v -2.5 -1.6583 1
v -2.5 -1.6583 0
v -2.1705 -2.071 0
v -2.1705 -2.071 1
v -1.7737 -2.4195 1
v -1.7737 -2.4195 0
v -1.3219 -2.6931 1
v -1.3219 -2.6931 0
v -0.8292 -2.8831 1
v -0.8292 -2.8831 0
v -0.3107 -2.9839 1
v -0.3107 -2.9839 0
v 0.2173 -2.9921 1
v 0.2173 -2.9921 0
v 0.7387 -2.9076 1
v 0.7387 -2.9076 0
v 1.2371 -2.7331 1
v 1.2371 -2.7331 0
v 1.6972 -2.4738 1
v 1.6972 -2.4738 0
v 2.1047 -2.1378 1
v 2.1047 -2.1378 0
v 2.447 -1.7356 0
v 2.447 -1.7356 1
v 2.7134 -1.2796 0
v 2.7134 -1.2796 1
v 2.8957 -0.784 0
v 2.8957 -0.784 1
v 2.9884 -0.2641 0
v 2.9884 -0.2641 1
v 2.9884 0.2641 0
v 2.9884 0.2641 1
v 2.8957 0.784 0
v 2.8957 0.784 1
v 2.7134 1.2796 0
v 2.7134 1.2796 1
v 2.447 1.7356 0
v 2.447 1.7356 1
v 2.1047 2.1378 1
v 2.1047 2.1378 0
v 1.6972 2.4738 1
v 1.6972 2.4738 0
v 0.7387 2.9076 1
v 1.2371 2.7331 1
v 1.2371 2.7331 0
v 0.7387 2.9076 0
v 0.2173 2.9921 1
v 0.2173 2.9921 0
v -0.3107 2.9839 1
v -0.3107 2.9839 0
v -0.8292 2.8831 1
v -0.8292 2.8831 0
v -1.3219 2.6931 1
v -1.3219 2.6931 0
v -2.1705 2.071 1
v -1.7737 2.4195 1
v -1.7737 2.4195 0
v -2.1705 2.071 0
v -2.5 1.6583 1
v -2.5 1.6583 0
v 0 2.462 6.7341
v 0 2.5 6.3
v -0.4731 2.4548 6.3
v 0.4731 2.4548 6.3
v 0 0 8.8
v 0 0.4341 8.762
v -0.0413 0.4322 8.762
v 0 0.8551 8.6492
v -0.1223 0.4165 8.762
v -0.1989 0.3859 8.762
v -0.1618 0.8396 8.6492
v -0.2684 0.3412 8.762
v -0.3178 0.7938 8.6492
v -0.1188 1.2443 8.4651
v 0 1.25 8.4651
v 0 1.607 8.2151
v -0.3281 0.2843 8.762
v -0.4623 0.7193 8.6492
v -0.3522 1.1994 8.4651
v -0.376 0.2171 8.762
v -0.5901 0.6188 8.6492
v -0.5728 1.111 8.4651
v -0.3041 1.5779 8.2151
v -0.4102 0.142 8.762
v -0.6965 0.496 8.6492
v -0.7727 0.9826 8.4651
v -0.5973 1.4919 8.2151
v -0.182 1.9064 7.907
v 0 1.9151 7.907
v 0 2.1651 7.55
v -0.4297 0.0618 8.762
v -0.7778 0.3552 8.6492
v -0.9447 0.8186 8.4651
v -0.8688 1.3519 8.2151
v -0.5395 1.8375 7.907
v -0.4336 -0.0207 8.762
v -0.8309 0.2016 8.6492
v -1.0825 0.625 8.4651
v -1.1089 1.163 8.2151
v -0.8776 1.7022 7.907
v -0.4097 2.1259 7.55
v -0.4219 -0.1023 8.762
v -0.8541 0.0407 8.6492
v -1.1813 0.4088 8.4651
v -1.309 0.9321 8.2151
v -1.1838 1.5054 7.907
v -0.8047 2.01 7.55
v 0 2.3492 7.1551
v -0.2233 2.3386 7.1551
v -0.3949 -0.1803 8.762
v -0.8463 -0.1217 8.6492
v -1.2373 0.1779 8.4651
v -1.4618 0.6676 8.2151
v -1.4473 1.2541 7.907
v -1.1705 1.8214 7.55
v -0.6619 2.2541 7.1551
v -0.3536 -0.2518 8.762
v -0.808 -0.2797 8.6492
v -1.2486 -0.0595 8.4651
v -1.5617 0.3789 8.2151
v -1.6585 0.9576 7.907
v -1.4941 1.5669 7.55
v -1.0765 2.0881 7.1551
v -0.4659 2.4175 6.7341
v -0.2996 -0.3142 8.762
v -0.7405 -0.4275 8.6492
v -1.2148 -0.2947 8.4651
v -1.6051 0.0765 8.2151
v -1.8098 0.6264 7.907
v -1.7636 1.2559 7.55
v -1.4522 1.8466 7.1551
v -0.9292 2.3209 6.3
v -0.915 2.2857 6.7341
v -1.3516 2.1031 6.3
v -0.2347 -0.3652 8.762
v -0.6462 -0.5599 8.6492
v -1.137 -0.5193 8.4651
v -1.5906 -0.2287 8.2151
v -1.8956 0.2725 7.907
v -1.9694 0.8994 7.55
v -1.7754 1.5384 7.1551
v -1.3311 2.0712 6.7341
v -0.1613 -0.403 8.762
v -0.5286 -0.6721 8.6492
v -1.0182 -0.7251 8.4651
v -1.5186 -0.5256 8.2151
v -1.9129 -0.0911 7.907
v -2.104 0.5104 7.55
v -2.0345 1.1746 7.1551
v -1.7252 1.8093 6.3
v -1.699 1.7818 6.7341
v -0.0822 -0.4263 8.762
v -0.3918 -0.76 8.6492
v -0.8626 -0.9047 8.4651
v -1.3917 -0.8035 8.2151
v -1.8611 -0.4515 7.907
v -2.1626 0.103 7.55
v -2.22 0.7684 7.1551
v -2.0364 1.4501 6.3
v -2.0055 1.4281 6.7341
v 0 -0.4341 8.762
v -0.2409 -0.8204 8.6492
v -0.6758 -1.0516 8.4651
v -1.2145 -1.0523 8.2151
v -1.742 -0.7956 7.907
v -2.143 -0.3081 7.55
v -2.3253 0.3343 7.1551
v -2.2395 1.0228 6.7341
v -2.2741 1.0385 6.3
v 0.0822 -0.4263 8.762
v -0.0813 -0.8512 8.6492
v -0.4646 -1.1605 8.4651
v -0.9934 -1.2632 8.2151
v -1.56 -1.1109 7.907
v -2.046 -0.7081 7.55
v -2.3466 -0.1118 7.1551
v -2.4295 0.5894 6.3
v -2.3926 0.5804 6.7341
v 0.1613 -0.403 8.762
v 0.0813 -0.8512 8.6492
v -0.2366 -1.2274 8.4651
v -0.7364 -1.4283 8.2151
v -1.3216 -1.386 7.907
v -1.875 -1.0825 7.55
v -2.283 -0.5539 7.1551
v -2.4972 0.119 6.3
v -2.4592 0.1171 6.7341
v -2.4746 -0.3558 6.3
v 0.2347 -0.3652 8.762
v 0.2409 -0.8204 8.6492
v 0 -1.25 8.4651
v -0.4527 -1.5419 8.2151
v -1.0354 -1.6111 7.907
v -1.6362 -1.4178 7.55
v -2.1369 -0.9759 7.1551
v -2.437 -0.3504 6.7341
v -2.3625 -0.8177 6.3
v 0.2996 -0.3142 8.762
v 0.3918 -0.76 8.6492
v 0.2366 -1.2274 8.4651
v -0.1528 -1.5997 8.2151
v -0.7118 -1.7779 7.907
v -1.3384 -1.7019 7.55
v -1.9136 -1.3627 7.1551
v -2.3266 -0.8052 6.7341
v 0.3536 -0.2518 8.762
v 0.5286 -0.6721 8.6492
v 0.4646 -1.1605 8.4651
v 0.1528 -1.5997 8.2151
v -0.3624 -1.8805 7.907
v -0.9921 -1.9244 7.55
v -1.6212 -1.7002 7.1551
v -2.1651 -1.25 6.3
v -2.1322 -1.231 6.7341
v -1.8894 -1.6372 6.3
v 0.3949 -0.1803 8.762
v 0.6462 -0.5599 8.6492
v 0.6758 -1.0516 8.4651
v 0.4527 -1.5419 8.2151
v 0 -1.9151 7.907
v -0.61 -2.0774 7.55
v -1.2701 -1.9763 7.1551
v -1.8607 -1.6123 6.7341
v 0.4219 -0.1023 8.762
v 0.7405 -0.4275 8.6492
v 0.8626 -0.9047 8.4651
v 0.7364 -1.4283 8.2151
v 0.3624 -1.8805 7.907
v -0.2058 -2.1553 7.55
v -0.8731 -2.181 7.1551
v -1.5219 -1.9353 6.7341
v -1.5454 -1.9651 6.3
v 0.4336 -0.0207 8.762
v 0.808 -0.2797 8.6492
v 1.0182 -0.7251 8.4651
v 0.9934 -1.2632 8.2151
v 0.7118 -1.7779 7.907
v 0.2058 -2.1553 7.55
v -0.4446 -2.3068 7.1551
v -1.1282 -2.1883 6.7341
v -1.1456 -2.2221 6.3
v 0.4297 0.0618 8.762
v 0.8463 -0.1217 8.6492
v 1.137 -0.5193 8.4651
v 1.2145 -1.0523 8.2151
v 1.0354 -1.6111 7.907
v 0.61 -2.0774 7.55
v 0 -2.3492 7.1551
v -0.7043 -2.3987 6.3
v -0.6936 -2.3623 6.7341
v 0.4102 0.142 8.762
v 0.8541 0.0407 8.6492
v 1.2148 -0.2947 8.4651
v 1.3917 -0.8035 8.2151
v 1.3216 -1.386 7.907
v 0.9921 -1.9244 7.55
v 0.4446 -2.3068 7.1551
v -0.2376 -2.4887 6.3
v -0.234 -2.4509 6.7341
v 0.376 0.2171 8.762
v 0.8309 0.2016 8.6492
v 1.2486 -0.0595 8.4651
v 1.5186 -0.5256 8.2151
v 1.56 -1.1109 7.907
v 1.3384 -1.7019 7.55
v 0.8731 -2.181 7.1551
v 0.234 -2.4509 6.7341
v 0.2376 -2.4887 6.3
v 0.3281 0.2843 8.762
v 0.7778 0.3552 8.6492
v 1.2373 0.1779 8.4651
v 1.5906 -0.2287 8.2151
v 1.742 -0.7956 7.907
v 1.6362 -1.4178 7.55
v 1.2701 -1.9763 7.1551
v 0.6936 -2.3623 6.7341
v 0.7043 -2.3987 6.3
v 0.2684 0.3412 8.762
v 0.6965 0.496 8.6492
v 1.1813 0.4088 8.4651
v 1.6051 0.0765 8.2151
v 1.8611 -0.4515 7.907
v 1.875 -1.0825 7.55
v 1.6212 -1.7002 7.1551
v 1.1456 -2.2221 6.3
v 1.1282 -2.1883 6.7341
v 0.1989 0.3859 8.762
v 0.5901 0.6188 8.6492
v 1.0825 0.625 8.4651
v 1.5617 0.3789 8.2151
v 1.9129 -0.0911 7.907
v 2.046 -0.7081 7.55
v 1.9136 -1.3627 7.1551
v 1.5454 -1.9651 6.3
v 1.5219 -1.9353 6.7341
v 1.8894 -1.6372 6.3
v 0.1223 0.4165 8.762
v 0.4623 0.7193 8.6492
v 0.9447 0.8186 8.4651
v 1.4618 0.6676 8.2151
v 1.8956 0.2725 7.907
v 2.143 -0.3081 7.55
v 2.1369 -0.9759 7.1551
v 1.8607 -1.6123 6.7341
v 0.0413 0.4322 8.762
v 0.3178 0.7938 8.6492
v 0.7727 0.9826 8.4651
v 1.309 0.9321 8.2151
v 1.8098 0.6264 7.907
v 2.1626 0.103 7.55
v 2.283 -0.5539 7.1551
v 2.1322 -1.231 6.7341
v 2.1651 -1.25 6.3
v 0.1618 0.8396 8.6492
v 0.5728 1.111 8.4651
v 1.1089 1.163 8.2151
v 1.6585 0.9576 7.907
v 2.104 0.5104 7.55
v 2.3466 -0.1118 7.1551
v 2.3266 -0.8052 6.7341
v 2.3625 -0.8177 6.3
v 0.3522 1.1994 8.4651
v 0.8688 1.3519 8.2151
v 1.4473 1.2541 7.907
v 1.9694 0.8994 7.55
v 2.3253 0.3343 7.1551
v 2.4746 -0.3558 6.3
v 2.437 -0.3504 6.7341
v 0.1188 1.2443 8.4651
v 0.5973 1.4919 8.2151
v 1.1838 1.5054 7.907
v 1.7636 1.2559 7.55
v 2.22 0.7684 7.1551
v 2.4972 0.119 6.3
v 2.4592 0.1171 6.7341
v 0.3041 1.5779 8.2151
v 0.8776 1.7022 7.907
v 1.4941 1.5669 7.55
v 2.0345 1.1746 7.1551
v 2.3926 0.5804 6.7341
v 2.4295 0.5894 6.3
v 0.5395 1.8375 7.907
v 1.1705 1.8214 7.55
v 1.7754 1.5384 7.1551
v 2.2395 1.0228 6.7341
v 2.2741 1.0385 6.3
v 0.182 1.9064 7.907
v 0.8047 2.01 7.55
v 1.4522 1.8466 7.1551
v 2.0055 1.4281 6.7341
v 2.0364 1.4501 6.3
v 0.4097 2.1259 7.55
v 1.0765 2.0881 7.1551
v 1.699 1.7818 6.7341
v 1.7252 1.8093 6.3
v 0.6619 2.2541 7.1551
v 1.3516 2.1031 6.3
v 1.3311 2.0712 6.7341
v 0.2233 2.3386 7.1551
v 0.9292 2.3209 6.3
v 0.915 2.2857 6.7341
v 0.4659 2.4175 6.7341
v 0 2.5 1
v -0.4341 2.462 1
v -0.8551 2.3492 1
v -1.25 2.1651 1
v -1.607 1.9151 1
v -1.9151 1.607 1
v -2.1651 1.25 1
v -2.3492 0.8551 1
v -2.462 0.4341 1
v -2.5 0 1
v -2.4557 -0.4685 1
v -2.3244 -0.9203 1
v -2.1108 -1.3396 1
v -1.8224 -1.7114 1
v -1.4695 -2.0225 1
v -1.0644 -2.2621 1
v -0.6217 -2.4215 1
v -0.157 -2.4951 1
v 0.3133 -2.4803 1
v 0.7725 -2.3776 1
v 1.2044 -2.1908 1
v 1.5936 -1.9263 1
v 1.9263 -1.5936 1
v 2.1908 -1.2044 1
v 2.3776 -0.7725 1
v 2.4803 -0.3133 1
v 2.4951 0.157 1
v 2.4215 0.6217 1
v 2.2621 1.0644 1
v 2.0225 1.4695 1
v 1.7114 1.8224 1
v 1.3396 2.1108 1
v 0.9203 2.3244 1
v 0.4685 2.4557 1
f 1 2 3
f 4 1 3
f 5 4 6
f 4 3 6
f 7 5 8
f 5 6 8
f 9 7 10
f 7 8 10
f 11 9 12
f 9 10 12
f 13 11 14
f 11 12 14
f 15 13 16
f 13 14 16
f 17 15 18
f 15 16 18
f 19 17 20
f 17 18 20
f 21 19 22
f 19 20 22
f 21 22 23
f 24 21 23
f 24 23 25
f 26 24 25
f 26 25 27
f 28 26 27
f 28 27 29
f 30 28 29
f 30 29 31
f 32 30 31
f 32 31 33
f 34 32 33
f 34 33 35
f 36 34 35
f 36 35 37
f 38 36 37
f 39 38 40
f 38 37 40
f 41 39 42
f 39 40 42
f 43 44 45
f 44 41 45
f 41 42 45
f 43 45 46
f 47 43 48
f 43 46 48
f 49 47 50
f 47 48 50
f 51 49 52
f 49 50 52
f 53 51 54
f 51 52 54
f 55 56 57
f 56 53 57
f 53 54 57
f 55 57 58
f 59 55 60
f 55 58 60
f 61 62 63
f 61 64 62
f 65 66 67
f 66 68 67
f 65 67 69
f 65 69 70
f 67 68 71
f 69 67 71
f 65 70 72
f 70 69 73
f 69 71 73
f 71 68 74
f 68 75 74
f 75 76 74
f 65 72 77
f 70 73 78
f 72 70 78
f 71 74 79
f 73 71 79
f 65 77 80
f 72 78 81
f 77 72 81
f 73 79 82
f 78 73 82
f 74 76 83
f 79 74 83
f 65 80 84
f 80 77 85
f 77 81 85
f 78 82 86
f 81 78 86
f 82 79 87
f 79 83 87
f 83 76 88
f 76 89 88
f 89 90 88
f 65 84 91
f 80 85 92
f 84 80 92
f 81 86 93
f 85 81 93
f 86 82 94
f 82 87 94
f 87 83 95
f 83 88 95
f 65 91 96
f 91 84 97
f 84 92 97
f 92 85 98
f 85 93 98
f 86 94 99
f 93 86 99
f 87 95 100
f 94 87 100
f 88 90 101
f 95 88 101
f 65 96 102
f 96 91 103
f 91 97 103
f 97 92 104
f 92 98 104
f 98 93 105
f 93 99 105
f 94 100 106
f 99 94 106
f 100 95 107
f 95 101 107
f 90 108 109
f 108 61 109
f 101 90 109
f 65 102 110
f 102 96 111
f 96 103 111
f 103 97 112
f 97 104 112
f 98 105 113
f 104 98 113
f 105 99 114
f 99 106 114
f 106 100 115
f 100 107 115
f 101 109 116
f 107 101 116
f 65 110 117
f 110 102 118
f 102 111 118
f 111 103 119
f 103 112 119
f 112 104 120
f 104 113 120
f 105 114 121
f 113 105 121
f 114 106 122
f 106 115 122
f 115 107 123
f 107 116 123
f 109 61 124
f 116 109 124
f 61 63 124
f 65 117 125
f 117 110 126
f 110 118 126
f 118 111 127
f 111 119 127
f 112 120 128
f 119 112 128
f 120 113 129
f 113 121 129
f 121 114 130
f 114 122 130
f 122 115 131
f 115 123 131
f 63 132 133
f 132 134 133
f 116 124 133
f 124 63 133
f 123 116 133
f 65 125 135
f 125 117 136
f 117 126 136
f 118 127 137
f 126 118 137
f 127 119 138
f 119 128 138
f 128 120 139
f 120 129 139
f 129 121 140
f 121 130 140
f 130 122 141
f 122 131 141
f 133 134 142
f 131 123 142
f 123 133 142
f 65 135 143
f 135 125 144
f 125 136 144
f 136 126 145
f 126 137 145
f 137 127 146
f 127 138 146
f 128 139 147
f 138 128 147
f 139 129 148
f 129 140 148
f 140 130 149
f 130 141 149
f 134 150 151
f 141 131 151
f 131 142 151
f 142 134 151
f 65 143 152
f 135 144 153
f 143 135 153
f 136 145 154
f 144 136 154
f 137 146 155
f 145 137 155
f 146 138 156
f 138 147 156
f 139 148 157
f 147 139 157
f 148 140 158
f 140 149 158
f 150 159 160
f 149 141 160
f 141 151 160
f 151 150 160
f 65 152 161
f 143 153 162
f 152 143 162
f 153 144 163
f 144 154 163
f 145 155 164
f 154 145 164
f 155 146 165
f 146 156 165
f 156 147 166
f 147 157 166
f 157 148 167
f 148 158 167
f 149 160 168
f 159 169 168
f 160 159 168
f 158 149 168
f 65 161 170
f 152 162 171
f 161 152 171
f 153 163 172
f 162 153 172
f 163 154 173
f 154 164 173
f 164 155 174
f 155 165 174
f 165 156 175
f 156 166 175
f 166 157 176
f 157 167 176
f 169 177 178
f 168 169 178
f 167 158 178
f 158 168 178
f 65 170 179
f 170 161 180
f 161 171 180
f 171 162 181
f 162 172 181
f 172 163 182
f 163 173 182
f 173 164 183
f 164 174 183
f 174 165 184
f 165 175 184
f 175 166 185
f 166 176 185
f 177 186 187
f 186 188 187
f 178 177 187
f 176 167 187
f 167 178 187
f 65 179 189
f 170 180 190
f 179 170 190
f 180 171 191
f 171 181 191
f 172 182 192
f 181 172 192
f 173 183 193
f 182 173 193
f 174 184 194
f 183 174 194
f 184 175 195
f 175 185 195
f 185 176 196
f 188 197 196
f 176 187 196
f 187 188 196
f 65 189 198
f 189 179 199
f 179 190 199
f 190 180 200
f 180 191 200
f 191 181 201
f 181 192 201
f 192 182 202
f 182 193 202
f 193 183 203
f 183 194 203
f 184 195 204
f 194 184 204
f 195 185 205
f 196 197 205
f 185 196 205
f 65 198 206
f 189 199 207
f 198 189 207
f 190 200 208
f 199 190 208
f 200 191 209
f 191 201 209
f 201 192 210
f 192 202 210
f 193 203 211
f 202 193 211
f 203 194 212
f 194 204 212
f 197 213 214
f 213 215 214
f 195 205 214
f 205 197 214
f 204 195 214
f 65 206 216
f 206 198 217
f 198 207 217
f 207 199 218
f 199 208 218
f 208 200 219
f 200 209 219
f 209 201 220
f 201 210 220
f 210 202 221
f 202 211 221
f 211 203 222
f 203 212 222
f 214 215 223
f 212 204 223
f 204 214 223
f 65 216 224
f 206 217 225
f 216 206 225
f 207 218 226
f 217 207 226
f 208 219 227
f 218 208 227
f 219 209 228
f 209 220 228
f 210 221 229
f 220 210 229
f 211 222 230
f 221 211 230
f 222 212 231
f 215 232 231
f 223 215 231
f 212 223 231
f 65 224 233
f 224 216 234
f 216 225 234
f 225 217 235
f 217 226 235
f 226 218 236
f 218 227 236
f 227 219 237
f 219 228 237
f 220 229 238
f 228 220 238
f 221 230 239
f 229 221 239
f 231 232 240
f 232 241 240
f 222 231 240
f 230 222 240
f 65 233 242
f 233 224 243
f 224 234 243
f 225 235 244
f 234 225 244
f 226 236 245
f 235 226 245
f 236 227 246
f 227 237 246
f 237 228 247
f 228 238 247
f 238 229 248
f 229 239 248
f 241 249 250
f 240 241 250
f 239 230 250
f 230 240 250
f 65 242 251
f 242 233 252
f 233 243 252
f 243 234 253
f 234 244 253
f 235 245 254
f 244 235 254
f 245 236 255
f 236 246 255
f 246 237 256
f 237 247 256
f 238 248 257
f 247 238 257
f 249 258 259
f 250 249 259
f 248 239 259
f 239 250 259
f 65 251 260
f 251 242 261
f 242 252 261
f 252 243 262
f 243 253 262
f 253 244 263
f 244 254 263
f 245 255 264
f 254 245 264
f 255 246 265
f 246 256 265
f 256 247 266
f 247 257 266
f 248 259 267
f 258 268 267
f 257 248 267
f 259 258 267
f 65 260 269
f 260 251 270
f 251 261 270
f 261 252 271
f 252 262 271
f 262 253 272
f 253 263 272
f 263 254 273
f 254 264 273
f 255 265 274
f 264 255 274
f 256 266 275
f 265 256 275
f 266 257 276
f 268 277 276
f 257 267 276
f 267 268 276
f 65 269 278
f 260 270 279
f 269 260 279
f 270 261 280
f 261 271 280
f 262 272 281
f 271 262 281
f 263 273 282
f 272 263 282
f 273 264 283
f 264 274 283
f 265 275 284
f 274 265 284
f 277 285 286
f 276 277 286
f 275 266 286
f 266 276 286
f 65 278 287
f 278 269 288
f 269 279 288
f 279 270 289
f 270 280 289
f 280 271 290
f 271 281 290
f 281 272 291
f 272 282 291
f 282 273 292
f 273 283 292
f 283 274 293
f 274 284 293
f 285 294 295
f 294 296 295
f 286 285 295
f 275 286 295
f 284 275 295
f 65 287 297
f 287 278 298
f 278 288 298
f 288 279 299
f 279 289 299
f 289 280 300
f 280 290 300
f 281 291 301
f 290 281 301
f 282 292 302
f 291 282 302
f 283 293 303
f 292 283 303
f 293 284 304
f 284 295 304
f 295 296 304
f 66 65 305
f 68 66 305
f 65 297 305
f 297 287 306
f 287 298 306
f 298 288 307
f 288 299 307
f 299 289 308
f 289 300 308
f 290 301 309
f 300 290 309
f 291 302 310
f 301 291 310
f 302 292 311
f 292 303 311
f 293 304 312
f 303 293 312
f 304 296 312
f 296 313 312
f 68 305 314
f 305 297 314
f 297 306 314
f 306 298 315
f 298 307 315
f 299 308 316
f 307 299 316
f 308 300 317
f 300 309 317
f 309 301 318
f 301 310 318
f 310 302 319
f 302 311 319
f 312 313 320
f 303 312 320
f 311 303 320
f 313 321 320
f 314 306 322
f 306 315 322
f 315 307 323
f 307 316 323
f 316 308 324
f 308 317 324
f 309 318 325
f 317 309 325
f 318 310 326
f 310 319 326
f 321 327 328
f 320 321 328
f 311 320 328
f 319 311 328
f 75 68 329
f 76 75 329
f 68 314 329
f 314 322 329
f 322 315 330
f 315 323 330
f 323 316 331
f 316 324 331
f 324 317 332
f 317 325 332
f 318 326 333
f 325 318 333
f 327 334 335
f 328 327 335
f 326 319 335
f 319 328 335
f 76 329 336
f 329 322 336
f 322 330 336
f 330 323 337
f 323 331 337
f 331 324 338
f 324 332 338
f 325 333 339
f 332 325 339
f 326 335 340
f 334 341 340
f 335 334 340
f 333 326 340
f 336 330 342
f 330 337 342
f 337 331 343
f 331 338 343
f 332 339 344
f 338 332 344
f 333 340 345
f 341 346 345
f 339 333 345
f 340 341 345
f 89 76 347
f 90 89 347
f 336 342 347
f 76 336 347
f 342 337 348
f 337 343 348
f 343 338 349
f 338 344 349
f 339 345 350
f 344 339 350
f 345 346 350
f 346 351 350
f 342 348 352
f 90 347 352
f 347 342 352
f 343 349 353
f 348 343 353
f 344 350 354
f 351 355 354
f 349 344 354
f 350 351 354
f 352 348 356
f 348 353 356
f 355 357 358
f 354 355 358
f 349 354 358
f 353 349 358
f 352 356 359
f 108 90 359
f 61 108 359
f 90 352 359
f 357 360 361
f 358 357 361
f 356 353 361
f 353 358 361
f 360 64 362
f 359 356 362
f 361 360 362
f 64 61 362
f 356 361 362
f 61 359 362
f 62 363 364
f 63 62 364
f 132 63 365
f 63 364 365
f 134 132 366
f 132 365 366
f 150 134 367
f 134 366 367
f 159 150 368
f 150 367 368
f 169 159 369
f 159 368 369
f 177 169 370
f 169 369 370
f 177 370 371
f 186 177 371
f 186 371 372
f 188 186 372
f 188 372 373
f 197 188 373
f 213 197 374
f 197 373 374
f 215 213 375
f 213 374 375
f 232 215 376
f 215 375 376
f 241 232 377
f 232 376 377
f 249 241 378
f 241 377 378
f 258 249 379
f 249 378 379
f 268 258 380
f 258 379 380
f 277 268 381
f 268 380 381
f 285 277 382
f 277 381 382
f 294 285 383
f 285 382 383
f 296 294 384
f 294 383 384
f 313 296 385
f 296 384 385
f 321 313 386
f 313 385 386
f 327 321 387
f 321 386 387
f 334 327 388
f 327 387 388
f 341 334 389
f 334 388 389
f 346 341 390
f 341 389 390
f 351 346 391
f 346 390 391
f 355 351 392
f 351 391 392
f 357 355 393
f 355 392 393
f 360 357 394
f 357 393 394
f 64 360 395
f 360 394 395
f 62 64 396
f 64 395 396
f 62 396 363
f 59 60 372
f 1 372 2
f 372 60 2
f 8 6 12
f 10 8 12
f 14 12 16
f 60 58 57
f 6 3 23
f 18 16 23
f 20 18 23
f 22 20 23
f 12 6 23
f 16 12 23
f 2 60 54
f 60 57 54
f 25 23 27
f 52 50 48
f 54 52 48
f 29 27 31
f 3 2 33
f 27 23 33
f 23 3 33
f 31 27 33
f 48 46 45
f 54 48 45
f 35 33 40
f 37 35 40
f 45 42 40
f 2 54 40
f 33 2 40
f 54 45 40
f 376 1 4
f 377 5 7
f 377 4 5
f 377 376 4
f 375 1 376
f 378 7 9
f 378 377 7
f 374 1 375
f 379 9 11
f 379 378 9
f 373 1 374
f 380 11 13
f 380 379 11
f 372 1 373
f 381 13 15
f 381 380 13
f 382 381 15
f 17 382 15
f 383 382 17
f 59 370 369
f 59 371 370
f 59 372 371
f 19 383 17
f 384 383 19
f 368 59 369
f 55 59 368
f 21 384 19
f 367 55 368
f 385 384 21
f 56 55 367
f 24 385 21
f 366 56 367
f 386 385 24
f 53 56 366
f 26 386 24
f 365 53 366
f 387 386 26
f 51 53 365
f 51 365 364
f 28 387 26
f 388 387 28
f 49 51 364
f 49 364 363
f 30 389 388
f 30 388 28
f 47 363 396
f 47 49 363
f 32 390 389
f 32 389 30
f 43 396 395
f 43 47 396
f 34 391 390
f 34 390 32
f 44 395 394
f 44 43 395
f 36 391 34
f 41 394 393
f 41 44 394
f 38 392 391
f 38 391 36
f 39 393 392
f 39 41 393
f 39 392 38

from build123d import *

# Parameters (mm, degrees)
ESBO_O1_R                = 3
RESSALTO_EXTRUS_O1_DEPTH = 1
CORTE_EXTRUS_O1_DEPTH    = 1


with BuildPart() as part:
    # Esboço1 → Ressalto-extrusão1 (new body)
    with BuildSketch(Plane.XY):
        Circle(ESBO_O1_R)
    extrude(amount=RESSALTO_EXTRUS_O1_DEPTH)

    # Esboço3 → Revolução1 (revolve)
    with BuildSketch(Plane(origin=(0, 0, 0), x_dir=(0, 0, -1), z_dir=(1, 0, 0))):
        with BuildLine():
            Line((-1, 0), (-8.8, 0))
            ThreePointArc((-8.8, 0), (-8.067766953, 1.767766953), (-6.3, 2.5))
            Line((-6.3, 2.5), (-1, 2.5))
            Line((-1, 2.5), (-1, 0))
        make_face()
    revolve(axis=Axis((0, 0, 1), (0, 0, 1)))

    # Esboço4 → Corte-extrusão1 (cut)
    with BuildSketch(Plane(origin=(0, 0, 0), x_dir=(-1, 0, 0), z_dir=(0, 0, -1))):
        with BuildLine():
            Line((2.5, 1.658312395), (2.5, -1.658312395))
            ThreePointArc((2.5, -1.658312395), (3, 0), (2.5, 1.658312395))
        make_face()
    extrude(amount=-CORTE_EXTRUS_O1_DEPTH, mode=Mode.SUBTRACT)


solid = part.part
